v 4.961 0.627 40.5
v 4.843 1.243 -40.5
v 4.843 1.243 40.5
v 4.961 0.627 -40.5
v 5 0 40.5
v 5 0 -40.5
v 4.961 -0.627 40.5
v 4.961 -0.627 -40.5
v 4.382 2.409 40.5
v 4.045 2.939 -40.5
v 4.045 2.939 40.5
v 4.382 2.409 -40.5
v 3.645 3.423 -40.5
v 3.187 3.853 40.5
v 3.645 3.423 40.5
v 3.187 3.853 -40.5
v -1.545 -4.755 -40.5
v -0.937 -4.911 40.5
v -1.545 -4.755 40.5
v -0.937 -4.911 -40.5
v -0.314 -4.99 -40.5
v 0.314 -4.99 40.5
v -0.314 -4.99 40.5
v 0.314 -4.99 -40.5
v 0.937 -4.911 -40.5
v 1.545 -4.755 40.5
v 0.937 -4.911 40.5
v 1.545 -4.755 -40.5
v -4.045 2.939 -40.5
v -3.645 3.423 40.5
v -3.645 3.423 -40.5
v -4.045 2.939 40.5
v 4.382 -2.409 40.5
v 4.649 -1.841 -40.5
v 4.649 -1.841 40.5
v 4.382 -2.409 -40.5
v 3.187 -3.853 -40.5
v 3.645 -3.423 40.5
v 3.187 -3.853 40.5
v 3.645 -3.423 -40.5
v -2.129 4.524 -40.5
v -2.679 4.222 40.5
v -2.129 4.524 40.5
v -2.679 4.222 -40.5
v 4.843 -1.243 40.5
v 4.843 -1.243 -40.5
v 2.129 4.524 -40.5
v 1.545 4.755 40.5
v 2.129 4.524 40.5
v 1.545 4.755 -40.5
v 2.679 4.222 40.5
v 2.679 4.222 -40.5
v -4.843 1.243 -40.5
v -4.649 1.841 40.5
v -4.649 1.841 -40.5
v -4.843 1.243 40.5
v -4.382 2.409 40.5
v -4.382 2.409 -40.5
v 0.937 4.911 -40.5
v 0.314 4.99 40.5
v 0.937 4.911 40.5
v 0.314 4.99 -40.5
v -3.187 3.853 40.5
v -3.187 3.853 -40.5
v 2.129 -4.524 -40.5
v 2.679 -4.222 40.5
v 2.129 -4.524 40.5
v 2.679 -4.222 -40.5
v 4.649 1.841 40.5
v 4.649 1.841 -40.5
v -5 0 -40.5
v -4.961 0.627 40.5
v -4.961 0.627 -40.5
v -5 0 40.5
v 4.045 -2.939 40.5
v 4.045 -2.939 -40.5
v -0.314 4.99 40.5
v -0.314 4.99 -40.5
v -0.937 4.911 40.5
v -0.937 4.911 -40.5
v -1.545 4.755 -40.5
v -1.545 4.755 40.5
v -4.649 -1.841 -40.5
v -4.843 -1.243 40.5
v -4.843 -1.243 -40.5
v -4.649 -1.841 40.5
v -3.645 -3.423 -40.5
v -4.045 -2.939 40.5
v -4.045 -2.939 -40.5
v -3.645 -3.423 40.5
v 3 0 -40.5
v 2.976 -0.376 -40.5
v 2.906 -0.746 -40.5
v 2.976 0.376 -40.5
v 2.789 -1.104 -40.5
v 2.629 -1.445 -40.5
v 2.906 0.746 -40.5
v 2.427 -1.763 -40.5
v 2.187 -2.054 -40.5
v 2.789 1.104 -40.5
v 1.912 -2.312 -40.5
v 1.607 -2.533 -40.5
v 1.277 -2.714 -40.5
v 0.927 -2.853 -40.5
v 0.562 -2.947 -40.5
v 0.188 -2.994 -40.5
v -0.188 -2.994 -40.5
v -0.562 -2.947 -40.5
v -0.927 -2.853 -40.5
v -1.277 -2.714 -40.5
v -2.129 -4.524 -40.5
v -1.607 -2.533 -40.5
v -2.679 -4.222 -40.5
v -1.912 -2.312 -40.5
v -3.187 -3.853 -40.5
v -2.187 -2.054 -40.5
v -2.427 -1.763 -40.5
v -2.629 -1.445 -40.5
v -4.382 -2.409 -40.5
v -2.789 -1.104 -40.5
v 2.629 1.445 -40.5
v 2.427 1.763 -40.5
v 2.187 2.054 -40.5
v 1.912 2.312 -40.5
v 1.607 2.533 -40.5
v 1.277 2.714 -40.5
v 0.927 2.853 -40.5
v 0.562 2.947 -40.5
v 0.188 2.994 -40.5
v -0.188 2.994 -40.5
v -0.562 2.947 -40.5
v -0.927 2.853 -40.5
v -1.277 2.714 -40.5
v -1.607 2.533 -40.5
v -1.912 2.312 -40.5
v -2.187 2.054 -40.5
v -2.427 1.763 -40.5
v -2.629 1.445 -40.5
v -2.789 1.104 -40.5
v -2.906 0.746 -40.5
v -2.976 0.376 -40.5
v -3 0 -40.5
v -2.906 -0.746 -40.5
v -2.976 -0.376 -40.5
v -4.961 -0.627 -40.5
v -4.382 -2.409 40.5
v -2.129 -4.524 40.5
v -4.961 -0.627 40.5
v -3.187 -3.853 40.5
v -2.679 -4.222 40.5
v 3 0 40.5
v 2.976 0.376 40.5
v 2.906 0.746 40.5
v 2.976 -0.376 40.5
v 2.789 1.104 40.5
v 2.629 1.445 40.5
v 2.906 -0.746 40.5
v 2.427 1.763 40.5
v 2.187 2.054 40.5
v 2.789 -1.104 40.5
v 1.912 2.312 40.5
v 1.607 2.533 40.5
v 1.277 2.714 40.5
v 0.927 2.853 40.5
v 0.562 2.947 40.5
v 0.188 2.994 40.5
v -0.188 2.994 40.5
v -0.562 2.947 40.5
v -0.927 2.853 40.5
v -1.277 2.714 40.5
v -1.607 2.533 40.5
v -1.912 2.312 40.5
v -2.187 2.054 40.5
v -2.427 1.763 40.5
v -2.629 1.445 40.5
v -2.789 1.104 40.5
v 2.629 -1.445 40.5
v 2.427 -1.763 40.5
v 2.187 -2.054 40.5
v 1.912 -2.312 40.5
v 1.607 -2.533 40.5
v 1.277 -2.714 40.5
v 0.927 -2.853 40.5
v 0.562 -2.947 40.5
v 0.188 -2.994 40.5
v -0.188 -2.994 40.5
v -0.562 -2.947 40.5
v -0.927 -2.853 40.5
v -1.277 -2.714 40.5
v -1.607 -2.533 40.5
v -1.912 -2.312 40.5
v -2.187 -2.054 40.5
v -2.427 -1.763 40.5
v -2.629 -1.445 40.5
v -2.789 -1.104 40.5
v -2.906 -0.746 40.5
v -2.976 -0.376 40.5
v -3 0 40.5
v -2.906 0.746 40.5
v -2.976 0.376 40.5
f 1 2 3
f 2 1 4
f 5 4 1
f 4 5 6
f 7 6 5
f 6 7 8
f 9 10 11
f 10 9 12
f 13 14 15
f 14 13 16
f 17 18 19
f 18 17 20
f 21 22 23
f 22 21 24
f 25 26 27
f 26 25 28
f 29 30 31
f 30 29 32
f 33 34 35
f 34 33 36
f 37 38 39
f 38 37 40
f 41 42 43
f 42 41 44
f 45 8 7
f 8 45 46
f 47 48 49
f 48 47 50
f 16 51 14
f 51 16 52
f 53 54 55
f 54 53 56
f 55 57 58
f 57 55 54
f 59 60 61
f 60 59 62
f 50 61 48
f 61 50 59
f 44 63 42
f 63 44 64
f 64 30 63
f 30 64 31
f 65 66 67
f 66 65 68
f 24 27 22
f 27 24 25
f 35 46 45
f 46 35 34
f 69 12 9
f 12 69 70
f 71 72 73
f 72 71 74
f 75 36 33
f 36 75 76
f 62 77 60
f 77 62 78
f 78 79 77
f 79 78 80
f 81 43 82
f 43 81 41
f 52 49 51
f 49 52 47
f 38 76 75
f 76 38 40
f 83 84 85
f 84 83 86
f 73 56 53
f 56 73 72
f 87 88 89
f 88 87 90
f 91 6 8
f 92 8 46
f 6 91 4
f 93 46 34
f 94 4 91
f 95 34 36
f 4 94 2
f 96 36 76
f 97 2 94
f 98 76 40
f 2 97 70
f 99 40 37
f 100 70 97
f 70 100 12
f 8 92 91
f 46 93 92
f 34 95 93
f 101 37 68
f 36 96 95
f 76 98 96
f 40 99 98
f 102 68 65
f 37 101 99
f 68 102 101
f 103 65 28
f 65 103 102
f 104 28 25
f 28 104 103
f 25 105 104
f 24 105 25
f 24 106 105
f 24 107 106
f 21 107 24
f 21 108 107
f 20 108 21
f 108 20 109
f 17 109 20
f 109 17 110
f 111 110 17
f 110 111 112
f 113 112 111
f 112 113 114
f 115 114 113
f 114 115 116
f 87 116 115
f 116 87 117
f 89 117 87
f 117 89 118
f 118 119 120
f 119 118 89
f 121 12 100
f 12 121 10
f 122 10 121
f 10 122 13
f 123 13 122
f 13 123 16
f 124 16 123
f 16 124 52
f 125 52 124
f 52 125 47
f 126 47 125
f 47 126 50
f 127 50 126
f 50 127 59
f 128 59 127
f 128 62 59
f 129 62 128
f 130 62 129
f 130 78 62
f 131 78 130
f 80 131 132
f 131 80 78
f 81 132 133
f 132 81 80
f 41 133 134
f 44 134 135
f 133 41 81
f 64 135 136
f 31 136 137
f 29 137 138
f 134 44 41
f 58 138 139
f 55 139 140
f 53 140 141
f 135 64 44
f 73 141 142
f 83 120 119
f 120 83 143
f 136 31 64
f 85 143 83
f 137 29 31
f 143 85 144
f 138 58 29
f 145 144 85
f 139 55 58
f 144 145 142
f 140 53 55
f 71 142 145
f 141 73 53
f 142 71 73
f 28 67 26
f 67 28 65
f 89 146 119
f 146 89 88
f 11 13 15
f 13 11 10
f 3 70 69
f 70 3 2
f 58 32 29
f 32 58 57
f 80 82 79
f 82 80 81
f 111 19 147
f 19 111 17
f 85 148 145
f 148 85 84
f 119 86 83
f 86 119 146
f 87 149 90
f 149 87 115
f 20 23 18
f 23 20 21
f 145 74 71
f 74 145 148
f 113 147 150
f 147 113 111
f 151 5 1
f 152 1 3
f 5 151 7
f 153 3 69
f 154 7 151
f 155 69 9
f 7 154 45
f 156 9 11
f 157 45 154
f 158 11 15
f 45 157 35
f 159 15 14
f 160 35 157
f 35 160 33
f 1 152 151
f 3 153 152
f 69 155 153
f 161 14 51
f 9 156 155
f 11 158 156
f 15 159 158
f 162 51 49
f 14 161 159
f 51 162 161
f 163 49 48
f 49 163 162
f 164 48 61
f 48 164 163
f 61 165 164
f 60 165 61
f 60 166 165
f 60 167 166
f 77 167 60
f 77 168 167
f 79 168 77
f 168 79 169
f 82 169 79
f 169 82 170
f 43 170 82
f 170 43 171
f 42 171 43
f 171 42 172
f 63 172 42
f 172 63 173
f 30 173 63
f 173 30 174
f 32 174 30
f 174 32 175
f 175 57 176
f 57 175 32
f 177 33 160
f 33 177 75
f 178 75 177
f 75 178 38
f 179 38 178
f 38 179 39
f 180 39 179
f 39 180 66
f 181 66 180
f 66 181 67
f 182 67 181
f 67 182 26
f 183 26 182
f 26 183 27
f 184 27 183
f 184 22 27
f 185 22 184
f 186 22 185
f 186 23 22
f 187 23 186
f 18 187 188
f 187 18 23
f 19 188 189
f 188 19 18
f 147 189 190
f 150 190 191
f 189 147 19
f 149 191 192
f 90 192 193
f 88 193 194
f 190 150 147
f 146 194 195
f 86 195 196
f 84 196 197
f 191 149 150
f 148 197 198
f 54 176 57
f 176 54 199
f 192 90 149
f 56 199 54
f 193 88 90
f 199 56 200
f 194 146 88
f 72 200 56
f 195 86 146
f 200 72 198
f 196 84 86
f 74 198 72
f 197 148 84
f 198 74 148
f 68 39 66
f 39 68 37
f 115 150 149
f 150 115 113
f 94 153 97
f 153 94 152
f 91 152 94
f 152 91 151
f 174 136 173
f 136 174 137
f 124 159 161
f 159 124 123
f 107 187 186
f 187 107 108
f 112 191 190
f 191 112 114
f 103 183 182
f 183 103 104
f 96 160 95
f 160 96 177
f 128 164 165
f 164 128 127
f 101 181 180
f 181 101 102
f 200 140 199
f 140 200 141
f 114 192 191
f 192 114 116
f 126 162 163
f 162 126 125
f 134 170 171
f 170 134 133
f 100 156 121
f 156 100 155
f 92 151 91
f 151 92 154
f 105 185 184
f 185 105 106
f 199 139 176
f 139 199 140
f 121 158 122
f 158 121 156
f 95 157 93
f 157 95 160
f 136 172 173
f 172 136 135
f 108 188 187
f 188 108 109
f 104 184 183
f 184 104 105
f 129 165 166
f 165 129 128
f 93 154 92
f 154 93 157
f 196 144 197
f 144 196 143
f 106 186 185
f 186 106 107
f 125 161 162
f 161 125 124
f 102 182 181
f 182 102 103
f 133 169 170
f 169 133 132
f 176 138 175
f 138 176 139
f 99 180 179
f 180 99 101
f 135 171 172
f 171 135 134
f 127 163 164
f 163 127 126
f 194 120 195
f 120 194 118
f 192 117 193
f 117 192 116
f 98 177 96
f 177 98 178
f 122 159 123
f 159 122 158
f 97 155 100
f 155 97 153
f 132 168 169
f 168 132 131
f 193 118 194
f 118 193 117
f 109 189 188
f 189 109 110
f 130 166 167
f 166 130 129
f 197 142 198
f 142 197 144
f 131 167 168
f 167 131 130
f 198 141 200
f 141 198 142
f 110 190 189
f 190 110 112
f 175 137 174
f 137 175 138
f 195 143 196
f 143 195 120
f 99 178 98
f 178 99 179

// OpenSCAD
$fn = 50;


difference() {
	union() {
		translate(v = [0, 0, -40.5000000000]) {
			cylinder(h = 81, r = 5.0000000000);
		}
	}
	union() {
		translate(v = [0, 0, -100.0000000000]) {
			cylinder(h = 200, r = 3.0000000000);
		}
	}
}
